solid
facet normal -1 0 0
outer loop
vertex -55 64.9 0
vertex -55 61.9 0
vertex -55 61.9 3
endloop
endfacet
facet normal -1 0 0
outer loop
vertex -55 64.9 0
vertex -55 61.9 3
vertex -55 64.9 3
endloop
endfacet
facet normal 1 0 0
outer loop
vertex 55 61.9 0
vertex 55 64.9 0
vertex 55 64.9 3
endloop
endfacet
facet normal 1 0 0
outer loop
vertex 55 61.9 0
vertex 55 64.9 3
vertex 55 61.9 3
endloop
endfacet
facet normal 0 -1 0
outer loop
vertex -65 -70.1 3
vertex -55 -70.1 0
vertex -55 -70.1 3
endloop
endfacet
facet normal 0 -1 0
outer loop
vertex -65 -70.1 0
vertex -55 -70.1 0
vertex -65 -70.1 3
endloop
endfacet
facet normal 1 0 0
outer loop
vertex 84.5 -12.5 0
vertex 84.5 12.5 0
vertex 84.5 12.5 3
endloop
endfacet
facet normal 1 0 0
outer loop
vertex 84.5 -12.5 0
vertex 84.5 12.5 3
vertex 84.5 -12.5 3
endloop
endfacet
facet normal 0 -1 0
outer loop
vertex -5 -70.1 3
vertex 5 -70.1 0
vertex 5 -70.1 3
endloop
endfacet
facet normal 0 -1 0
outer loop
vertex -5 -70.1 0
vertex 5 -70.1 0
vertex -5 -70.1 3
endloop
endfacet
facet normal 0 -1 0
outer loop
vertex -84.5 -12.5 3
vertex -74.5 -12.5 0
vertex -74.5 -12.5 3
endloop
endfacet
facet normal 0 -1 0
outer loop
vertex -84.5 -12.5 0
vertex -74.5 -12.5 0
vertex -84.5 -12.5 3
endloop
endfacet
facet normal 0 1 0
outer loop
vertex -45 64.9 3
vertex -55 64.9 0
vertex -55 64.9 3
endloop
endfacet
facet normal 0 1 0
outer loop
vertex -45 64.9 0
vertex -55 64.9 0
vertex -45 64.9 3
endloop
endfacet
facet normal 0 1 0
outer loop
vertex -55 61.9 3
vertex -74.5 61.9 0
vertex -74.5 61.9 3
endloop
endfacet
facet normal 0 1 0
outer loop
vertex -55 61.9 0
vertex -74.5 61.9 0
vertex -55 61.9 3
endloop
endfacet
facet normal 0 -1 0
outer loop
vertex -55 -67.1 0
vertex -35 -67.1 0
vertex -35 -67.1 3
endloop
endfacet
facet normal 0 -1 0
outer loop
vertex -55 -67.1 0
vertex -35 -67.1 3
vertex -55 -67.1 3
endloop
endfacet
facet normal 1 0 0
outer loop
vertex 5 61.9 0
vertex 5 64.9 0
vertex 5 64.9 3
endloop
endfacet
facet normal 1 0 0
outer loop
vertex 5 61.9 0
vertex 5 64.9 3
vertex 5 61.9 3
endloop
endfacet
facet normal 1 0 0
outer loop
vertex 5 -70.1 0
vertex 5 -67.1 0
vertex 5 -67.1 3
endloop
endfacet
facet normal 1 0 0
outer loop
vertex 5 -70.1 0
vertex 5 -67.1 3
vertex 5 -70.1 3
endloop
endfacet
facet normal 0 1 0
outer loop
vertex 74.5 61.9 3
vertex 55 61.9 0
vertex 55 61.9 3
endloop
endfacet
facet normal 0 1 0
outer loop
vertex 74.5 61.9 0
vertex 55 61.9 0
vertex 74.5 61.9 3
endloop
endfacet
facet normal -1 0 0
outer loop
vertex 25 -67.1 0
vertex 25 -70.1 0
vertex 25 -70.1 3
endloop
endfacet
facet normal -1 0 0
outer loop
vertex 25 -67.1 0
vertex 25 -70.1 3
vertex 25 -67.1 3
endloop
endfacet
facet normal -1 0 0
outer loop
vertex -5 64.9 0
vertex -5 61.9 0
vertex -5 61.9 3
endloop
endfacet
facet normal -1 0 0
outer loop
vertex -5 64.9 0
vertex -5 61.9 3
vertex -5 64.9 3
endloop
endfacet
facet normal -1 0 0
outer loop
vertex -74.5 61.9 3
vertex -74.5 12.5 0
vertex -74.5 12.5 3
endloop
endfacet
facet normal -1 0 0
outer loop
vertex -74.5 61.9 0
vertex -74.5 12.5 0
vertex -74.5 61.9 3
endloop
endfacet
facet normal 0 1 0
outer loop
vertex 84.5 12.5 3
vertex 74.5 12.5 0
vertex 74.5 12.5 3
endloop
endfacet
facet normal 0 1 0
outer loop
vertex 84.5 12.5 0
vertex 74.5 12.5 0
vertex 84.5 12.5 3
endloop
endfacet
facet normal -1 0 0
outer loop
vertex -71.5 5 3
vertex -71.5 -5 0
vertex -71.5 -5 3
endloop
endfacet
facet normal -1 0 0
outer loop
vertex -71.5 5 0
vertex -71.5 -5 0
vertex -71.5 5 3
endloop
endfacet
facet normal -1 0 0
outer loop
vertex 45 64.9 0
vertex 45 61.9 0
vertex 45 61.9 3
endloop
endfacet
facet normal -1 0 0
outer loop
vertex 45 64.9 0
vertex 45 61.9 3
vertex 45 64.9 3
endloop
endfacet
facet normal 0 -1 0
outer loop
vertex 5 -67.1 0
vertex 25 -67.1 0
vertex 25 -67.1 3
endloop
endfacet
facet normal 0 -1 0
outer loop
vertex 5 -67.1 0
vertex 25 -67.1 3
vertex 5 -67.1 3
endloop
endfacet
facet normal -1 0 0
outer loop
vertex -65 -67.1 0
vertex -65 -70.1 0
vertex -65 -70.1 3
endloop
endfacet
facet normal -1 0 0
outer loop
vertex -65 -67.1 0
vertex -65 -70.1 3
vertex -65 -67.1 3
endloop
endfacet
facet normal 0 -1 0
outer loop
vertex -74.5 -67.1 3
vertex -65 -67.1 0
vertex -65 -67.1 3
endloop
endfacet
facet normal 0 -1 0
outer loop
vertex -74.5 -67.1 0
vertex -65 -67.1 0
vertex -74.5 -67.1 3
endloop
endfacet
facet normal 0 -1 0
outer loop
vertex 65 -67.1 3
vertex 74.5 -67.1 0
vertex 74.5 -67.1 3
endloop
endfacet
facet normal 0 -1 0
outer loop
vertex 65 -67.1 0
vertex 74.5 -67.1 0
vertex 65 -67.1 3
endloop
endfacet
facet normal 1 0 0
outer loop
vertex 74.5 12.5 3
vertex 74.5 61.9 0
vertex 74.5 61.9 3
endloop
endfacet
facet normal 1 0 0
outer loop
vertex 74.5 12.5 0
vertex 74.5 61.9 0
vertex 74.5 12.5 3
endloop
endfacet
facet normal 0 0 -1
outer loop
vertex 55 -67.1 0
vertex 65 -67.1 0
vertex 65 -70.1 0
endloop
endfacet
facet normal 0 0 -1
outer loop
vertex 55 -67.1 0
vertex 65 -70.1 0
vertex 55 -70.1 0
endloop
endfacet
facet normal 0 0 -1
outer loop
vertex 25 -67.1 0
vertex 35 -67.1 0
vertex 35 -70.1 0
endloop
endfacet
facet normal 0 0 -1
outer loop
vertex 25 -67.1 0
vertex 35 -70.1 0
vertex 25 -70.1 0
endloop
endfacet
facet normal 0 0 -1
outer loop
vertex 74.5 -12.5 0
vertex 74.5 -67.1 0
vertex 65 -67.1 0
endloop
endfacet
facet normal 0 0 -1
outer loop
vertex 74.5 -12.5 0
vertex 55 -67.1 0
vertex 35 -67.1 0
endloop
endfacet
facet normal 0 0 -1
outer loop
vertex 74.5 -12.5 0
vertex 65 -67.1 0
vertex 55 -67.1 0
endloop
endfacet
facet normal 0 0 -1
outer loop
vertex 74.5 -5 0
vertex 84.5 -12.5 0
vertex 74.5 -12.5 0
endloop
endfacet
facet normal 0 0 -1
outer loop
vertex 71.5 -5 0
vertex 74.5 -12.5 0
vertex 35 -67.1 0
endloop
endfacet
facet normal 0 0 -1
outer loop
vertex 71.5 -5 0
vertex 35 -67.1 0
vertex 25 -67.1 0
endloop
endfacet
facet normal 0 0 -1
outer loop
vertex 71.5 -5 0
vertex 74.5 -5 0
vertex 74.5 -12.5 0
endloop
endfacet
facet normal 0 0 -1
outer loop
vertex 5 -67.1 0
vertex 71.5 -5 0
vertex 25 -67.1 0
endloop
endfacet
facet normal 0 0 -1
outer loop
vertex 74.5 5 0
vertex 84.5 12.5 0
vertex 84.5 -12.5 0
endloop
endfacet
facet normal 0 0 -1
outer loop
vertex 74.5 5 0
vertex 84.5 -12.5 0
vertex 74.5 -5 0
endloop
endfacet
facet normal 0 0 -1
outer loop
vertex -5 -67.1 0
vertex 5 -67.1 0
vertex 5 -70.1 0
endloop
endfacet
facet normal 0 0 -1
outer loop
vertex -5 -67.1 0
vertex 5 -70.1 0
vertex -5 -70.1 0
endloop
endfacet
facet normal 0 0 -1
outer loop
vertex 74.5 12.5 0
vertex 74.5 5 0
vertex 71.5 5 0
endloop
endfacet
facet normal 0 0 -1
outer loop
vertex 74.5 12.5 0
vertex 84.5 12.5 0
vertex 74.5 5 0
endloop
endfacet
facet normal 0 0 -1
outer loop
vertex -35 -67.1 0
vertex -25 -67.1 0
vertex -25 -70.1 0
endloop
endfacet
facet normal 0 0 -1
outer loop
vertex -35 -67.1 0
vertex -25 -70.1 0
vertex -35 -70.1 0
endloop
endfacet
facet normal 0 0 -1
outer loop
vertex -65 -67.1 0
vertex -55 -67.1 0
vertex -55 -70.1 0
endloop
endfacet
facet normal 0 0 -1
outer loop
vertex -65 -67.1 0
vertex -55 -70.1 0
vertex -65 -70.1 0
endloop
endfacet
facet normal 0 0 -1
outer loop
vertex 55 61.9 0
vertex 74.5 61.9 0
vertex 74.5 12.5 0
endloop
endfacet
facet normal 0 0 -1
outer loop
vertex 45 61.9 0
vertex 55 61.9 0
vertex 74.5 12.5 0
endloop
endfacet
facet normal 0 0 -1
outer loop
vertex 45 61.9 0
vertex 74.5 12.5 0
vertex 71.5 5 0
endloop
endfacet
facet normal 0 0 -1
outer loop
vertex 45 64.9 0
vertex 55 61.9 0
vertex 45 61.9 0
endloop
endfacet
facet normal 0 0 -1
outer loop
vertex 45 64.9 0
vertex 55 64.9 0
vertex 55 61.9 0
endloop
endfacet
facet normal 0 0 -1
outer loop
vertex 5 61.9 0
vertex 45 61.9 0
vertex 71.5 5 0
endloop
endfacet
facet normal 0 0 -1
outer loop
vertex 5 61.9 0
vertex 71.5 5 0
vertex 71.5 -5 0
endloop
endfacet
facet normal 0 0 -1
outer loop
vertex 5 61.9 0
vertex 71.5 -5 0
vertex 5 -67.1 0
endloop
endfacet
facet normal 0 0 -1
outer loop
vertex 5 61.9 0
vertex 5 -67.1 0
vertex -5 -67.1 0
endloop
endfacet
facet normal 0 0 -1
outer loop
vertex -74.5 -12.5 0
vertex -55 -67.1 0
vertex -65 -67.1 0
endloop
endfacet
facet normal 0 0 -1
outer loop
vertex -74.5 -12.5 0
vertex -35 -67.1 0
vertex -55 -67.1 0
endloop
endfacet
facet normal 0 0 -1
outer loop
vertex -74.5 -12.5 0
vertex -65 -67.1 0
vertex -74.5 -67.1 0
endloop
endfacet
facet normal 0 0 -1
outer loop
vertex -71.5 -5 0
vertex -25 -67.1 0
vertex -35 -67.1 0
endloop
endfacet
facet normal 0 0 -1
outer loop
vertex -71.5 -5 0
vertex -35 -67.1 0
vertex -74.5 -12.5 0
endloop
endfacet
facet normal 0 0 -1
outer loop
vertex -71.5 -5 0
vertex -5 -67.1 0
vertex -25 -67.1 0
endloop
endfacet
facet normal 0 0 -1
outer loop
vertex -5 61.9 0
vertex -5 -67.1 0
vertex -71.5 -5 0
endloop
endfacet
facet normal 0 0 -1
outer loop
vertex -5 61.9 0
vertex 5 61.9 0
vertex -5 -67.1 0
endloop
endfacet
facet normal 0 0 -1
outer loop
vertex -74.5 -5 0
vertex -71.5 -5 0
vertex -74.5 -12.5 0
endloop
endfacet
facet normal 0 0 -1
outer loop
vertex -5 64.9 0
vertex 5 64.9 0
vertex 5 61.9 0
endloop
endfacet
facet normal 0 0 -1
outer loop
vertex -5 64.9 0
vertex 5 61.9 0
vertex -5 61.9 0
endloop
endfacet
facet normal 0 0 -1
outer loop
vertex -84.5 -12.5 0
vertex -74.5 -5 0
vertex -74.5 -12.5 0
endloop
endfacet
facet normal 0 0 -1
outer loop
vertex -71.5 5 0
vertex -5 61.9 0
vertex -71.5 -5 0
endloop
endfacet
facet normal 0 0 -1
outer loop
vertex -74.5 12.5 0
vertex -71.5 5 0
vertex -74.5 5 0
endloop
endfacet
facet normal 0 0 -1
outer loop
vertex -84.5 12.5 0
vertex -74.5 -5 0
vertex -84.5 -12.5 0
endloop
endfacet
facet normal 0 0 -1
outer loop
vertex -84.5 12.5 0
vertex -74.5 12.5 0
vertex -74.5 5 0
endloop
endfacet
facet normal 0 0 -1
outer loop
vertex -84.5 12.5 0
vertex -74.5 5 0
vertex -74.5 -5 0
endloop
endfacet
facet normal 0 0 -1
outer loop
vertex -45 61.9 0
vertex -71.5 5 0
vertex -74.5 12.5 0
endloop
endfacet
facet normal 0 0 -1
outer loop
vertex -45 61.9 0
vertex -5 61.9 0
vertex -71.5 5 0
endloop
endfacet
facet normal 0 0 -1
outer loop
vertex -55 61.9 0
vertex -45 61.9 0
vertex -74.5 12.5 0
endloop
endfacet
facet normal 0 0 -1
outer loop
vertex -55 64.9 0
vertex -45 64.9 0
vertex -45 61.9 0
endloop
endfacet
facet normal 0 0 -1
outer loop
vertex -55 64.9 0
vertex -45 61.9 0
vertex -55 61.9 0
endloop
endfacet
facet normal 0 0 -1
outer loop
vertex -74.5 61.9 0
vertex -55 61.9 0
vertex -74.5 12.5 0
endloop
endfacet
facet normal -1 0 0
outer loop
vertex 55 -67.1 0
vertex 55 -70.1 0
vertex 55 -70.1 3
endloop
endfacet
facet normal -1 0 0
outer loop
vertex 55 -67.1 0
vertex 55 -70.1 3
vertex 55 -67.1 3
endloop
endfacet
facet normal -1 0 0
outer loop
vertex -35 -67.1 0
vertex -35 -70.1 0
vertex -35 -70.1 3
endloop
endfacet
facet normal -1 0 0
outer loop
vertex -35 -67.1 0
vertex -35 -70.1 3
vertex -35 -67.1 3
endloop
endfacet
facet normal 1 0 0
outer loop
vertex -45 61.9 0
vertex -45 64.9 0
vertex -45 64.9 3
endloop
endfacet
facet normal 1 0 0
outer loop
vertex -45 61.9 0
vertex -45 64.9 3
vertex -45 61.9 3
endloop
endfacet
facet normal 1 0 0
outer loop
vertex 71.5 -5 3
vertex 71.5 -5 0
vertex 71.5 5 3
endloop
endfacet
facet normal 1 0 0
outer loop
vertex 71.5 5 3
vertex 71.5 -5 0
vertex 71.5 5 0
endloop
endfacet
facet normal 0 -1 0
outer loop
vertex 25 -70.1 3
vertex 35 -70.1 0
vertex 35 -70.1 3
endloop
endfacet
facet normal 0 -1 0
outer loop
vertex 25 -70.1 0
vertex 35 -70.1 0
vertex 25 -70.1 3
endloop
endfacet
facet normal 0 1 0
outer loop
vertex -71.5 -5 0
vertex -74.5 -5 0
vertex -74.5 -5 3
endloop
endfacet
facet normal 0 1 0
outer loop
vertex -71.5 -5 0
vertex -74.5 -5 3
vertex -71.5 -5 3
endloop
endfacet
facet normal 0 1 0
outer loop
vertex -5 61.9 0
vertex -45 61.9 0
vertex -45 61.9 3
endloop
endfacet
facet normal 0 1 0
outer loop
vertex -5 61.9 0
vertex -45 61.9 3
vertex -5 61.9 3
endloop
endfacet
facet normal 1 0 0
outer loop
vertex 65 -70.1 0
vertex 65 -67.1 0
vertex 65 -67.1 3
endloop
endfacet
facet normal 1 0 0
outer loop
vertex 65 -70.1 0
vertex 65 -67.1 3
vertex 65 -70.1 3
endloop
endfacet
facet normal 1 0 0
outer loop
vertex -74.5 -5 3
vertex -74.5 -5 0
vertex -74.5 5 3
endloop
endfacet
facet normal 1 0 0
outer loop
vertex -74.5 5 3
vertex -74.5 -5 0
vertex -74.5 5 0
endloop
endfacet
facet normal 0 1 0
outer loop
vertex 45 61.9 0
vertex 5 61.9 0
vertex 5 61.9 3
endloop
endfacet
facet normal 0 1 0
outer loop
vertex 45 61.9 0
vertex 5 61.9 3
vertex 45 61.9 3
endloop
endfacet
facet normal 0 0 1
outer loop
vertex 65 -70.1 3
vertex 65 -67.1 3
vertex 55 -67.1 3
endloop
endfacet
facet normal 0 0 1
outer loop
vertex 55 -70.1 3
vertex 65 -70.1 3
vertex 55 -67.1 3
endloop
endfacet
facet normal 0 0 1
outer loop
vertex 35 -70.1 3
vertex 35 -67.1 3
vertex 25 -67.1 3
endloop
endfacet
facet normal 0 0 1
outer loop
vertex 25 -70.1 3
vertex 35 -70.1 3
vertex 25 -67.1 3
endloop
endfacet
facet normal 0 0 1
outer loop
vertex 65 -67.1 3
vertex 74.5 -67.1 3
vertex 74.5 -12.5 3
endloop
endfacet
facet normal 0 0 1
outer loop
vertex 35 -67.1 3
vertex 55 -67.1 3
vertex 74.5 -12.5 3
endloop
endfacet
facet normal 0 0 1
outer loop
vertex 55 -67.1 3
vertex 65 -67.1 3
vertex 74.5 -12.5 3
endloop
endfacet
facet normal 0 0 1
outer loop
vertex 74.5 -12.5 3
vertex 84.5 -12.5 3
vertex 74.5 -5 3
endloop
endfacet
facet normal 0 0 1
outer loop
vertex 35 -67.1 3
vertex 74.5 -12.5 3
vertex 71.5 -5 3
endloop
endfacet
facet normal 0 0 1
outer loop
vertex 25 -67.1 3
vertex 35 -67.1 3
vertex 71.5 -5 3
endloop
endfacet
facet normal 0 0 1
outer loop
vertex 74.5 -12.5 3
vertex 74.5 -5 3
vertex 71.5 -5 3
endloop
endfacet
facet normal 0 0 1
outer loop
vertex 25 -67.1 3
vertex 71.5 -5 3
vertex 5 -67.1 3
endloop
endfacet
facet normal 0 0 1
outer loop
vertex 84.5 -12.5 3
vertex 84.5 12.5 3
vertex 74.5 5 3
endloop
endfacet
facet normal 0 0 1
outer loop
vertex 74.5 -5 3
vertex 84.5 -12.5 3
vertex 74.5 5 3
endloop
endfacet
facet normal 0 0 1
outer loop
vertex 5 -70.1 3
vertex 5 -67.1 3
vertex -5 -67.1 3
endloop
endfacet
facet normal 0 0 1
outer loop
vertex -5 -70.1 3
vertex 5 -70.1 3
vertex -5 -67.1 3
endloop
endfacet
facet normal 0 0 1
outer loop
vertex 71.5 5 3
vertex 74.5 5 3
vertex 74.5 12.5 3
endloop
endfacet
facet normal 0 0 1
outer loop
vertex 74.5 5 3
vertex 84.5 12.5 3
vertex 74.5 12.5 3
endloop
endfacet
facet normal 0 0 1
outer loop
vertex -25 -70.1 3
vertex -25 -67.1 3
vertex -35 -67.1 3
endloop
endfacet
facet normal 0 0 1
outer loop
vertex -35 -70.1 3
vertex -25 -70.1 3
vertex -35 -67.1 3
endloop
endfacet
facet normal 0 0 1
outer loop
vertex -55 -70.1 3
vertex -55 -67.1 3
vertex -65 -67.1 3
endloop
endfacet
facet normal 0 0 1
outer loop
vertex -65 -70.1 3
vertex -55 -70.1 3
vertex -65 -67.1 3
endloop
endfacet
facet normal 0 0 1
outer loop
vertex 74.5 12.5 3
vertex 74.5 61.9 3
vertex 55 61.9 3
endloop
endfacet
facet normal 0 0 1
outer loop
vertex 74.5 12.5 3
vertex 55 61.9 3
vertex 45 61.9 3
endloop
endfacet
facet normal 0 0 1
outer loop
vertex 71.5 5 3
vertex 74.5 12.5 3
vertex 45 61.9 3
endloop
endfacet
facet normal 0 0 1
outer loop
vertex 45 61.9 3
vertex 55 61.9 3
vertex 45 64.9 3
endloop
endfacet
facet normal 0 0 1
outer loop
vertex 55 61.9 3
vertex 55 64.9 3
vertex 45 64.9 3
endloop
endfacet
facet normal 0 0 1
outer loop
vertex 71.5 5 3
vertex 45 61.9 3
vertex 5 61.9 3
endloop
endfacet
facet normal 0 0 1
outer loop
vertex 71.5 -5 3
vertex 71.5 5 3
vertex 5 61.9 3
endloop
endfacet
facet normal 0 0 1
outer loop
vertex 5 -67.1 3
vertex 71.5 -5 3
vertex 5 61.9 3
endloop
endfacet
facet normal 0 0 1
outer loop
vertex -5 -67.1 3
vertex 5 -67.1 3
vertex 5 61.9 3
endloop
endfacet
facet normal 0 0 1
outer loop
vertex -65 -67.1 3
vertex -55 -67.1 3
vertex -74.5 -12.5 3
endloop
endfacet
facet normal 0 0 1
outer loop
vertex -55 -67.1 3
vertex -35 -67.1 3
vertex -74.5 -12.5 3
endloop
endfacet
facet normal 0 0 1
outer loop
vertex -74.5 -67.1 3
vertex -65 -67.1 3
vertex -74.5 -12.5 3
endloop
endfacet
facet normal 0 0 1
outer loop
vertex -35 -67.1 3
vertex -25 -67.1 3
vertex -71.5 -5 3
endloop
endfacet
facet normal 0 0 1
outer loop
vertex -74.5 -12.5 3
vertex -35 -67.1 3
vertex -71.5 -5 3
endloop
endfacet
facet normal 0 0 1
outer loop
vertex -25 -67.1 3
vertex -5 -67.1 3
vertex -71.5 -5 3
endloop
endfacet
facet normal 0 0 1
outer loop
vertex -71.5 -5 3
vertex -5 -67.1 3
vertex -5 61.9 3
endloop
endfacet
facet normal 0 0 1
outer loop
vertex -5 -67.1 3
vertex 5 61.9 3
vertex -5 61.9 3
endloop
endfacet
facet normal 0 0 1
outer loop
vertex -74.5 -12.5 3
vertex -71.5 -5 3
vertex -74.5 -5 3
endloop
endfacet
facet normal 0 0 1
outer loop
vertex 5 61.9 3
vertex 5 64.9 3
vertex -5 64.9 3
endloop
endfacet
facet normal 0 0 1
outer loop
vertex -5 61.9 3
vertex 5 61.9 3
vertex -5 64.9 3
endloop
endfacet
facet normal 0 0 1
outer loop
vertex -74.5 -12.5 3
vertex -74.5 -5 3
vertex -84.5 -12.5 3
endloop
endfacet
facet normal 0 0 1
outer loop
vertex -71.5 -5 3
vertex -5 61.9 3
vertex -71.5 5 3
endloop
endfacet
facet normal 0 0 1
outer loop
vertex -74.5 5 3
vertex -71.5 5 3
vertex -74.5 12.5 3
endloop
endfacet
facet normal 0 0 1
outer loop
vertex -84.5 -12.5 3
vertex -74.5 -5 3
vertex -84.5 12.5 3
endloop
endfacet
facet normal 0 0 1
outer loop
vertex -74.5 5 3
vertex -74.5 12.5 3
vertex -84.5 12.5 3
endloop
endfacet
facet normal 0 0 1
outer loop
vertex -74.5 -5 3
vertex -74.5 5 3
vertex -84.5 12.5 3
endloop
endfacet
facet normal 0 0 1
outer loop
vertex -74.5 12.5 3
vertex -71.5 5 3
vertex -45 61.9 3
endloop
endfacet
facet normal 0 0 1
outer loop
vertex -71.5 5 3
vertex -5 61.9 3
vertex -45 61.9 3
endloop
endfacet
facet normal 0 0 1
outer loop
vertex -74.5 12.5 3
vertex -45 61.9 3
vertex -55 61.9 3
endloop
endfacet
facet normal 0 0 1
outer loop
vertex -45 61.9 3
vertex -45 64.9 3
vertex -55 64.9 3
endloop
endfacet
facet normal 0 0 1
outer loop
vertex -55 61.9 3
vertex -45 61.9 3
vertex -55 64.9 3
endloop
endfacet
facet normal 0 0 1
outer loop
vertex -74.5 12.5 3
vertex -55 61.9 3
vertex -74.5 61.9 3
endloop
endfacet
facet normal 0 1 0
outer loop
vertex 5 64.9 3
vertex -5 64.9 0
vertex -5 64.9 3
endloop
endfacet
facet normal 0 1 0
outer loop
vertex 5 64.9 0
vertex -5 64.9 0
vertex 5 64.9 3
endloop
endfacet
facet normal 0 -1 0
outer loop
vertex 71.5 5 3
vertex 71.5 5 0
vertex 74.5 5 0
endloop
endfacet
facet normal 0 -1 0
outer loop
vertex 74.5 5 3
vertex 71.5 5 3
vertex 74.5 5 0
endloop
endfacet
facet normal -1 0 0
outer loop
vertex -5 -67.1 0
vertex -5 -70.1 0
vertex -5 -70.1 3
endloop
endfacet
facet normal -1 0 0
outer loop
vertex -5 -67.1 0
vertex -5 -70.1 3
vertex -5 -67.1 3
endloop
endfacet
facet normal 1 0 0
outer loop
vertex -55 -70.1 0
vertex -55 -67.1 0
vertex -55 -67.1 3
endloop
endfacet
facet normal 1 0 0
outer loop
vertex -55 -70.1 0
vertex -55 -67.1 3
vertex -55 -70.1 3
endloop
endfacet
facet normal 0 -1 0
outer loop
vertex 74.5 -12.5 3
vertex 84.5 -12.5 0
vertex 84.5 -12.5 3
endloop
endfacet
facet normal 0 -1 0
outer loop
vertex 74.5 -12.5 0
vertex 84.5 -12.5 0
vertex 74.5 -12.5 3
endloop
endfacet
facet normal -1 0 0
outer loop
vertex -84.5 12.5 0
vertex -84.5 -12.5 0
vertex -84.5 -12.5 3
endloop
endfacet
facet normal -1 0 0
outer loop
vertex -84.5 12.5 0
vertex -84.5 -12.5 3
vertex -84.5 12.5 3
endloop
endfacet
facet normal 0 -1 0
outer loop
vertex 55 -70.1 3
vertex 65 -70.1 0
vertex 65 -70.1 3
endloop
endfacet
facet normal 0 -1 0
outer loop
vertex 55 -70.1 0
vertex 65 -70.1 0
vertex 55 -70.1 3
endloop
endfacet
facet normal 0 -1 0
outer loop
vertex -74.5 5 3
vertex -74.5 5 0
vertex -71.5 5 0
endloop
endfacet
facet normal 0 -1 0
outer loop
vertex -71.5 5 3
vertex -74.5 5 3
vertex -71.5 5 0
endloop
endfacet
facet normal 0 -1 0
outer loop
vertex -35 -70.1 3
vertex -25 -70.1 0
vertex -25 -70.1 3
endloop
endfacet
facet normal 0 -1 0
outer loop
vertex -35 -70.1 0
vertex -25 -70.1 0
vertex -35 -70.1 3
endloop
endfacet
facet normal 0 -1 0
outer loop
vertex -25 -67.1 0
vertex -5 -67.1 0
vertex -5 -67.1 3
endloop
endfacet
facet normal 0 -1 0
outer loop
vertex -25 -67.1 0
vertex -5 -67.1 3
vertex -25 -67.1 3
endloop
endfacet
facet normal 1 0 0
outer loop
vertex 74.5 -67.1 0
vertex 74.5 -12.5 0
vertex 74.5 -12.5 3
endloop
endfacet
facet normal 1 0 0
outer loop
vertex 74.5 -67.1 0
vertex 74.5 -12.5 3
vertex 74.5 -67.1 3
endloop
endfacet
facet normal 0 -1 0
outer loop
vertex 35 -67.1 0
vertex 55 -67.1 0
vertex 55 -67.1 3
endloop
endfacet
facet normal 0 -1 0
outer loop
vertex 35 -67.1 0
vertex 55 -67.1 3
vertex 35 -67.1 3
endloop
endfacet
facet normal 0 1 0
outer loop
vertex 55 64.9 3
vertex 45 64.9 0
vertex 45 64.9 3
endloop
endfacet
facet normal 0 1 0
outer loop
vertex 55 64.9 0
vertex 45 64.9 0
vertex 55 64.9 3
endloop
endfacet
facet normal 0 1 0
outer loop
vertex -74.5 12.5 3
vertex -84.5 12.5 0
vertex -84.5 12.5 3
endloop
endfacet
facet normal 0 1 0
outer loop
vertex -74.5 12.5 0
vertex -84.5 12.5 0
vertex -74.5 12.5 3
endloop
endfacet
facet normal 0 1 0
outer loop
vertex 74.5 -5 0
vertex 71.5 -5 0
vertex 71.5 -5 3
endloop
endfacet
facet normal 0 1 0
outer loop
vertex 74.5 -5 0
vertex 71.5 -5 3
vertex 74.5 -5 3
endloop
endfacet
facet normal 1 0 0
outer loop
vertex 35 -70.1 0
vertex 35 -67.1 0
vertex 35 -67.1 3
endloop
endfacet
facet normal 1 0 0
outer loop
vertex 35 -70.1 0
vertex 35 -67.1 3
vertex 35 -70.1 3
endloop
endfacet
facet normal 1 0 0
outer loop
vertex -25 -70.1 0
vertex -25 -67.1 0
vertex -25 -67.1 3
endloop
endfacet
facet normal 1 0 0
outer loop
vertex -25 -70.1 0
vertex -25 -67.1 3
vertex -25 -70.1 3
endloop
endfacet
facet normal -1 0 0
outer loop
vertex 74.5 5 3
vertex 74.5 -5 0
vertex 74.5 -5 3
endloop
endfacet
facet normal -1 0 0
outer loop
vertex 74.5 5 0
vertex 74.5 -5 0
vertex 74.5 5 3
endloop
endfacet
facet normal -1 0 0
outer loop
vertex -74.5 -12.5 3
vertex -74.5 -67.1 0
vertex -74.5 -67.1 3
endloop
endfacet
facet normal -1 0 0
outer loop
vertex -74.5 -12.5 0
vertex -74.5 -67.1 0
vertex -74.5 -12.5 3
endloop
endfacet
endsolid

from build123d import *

# Parameters (mm, degrees)
SKETCH1_W           = 3
SKETCH1_H           = 10
BOSS_EXTRUDE1_DEPTH = 3


with BuildPart() as part:
    # Sketch1 → Boss-Extrude1 (new body)
    with BuildSketch(Plane.XY):
        Polygon((-74.5, 61.9), (-55, 61.9), (-55, 64.9), (-45, 64.9), (-45, 61.9), (-5, 61.9), (-5, 64.9), (5, 64.9), (5, 61.9), (45, 61.9), (45, 64.9), (55, 64.9), (55, 61.9), (74.5, 61.9), (74.5, 12.5), (84.5, 12.5), (84.5, -12.5), (74.5, -12.5), (74.5, -67.1), (65, -67.1), (65, -70.1), (55, -70.1), (55, -67.1), (35, -67.1), (35, -70.1), (25, -70.1), (25, -67.1), (5, -67.1), (5, -70.1), (-5, -70.1), (-5, -67.1), (-25, -67.1), (-25, -70.1), (-35, -70.1), (-35, -67.1), (-55, -67.1), (-55, -70.1), (-65, -70.1), (-65, -67.1), (-74.5, -67.1), (-74.5, -12.5), (-84.5, -12.5), (-84.5, 12.5), (-74.5, 12.5), align=None)
        with Locations((73, 0)):
            Rectangle(SKETCH1_W, SKETCH1_H, mode=Mode.SUBTRACT)
        with Locations((-73, 0)):
            Rectangle(SKETCH1_W, SKETCH1_H, mode=Mode.SUBTRACT)
    extrude(amount=BOSS_EXTRUDE1_DEPTH)


solid = part.part
